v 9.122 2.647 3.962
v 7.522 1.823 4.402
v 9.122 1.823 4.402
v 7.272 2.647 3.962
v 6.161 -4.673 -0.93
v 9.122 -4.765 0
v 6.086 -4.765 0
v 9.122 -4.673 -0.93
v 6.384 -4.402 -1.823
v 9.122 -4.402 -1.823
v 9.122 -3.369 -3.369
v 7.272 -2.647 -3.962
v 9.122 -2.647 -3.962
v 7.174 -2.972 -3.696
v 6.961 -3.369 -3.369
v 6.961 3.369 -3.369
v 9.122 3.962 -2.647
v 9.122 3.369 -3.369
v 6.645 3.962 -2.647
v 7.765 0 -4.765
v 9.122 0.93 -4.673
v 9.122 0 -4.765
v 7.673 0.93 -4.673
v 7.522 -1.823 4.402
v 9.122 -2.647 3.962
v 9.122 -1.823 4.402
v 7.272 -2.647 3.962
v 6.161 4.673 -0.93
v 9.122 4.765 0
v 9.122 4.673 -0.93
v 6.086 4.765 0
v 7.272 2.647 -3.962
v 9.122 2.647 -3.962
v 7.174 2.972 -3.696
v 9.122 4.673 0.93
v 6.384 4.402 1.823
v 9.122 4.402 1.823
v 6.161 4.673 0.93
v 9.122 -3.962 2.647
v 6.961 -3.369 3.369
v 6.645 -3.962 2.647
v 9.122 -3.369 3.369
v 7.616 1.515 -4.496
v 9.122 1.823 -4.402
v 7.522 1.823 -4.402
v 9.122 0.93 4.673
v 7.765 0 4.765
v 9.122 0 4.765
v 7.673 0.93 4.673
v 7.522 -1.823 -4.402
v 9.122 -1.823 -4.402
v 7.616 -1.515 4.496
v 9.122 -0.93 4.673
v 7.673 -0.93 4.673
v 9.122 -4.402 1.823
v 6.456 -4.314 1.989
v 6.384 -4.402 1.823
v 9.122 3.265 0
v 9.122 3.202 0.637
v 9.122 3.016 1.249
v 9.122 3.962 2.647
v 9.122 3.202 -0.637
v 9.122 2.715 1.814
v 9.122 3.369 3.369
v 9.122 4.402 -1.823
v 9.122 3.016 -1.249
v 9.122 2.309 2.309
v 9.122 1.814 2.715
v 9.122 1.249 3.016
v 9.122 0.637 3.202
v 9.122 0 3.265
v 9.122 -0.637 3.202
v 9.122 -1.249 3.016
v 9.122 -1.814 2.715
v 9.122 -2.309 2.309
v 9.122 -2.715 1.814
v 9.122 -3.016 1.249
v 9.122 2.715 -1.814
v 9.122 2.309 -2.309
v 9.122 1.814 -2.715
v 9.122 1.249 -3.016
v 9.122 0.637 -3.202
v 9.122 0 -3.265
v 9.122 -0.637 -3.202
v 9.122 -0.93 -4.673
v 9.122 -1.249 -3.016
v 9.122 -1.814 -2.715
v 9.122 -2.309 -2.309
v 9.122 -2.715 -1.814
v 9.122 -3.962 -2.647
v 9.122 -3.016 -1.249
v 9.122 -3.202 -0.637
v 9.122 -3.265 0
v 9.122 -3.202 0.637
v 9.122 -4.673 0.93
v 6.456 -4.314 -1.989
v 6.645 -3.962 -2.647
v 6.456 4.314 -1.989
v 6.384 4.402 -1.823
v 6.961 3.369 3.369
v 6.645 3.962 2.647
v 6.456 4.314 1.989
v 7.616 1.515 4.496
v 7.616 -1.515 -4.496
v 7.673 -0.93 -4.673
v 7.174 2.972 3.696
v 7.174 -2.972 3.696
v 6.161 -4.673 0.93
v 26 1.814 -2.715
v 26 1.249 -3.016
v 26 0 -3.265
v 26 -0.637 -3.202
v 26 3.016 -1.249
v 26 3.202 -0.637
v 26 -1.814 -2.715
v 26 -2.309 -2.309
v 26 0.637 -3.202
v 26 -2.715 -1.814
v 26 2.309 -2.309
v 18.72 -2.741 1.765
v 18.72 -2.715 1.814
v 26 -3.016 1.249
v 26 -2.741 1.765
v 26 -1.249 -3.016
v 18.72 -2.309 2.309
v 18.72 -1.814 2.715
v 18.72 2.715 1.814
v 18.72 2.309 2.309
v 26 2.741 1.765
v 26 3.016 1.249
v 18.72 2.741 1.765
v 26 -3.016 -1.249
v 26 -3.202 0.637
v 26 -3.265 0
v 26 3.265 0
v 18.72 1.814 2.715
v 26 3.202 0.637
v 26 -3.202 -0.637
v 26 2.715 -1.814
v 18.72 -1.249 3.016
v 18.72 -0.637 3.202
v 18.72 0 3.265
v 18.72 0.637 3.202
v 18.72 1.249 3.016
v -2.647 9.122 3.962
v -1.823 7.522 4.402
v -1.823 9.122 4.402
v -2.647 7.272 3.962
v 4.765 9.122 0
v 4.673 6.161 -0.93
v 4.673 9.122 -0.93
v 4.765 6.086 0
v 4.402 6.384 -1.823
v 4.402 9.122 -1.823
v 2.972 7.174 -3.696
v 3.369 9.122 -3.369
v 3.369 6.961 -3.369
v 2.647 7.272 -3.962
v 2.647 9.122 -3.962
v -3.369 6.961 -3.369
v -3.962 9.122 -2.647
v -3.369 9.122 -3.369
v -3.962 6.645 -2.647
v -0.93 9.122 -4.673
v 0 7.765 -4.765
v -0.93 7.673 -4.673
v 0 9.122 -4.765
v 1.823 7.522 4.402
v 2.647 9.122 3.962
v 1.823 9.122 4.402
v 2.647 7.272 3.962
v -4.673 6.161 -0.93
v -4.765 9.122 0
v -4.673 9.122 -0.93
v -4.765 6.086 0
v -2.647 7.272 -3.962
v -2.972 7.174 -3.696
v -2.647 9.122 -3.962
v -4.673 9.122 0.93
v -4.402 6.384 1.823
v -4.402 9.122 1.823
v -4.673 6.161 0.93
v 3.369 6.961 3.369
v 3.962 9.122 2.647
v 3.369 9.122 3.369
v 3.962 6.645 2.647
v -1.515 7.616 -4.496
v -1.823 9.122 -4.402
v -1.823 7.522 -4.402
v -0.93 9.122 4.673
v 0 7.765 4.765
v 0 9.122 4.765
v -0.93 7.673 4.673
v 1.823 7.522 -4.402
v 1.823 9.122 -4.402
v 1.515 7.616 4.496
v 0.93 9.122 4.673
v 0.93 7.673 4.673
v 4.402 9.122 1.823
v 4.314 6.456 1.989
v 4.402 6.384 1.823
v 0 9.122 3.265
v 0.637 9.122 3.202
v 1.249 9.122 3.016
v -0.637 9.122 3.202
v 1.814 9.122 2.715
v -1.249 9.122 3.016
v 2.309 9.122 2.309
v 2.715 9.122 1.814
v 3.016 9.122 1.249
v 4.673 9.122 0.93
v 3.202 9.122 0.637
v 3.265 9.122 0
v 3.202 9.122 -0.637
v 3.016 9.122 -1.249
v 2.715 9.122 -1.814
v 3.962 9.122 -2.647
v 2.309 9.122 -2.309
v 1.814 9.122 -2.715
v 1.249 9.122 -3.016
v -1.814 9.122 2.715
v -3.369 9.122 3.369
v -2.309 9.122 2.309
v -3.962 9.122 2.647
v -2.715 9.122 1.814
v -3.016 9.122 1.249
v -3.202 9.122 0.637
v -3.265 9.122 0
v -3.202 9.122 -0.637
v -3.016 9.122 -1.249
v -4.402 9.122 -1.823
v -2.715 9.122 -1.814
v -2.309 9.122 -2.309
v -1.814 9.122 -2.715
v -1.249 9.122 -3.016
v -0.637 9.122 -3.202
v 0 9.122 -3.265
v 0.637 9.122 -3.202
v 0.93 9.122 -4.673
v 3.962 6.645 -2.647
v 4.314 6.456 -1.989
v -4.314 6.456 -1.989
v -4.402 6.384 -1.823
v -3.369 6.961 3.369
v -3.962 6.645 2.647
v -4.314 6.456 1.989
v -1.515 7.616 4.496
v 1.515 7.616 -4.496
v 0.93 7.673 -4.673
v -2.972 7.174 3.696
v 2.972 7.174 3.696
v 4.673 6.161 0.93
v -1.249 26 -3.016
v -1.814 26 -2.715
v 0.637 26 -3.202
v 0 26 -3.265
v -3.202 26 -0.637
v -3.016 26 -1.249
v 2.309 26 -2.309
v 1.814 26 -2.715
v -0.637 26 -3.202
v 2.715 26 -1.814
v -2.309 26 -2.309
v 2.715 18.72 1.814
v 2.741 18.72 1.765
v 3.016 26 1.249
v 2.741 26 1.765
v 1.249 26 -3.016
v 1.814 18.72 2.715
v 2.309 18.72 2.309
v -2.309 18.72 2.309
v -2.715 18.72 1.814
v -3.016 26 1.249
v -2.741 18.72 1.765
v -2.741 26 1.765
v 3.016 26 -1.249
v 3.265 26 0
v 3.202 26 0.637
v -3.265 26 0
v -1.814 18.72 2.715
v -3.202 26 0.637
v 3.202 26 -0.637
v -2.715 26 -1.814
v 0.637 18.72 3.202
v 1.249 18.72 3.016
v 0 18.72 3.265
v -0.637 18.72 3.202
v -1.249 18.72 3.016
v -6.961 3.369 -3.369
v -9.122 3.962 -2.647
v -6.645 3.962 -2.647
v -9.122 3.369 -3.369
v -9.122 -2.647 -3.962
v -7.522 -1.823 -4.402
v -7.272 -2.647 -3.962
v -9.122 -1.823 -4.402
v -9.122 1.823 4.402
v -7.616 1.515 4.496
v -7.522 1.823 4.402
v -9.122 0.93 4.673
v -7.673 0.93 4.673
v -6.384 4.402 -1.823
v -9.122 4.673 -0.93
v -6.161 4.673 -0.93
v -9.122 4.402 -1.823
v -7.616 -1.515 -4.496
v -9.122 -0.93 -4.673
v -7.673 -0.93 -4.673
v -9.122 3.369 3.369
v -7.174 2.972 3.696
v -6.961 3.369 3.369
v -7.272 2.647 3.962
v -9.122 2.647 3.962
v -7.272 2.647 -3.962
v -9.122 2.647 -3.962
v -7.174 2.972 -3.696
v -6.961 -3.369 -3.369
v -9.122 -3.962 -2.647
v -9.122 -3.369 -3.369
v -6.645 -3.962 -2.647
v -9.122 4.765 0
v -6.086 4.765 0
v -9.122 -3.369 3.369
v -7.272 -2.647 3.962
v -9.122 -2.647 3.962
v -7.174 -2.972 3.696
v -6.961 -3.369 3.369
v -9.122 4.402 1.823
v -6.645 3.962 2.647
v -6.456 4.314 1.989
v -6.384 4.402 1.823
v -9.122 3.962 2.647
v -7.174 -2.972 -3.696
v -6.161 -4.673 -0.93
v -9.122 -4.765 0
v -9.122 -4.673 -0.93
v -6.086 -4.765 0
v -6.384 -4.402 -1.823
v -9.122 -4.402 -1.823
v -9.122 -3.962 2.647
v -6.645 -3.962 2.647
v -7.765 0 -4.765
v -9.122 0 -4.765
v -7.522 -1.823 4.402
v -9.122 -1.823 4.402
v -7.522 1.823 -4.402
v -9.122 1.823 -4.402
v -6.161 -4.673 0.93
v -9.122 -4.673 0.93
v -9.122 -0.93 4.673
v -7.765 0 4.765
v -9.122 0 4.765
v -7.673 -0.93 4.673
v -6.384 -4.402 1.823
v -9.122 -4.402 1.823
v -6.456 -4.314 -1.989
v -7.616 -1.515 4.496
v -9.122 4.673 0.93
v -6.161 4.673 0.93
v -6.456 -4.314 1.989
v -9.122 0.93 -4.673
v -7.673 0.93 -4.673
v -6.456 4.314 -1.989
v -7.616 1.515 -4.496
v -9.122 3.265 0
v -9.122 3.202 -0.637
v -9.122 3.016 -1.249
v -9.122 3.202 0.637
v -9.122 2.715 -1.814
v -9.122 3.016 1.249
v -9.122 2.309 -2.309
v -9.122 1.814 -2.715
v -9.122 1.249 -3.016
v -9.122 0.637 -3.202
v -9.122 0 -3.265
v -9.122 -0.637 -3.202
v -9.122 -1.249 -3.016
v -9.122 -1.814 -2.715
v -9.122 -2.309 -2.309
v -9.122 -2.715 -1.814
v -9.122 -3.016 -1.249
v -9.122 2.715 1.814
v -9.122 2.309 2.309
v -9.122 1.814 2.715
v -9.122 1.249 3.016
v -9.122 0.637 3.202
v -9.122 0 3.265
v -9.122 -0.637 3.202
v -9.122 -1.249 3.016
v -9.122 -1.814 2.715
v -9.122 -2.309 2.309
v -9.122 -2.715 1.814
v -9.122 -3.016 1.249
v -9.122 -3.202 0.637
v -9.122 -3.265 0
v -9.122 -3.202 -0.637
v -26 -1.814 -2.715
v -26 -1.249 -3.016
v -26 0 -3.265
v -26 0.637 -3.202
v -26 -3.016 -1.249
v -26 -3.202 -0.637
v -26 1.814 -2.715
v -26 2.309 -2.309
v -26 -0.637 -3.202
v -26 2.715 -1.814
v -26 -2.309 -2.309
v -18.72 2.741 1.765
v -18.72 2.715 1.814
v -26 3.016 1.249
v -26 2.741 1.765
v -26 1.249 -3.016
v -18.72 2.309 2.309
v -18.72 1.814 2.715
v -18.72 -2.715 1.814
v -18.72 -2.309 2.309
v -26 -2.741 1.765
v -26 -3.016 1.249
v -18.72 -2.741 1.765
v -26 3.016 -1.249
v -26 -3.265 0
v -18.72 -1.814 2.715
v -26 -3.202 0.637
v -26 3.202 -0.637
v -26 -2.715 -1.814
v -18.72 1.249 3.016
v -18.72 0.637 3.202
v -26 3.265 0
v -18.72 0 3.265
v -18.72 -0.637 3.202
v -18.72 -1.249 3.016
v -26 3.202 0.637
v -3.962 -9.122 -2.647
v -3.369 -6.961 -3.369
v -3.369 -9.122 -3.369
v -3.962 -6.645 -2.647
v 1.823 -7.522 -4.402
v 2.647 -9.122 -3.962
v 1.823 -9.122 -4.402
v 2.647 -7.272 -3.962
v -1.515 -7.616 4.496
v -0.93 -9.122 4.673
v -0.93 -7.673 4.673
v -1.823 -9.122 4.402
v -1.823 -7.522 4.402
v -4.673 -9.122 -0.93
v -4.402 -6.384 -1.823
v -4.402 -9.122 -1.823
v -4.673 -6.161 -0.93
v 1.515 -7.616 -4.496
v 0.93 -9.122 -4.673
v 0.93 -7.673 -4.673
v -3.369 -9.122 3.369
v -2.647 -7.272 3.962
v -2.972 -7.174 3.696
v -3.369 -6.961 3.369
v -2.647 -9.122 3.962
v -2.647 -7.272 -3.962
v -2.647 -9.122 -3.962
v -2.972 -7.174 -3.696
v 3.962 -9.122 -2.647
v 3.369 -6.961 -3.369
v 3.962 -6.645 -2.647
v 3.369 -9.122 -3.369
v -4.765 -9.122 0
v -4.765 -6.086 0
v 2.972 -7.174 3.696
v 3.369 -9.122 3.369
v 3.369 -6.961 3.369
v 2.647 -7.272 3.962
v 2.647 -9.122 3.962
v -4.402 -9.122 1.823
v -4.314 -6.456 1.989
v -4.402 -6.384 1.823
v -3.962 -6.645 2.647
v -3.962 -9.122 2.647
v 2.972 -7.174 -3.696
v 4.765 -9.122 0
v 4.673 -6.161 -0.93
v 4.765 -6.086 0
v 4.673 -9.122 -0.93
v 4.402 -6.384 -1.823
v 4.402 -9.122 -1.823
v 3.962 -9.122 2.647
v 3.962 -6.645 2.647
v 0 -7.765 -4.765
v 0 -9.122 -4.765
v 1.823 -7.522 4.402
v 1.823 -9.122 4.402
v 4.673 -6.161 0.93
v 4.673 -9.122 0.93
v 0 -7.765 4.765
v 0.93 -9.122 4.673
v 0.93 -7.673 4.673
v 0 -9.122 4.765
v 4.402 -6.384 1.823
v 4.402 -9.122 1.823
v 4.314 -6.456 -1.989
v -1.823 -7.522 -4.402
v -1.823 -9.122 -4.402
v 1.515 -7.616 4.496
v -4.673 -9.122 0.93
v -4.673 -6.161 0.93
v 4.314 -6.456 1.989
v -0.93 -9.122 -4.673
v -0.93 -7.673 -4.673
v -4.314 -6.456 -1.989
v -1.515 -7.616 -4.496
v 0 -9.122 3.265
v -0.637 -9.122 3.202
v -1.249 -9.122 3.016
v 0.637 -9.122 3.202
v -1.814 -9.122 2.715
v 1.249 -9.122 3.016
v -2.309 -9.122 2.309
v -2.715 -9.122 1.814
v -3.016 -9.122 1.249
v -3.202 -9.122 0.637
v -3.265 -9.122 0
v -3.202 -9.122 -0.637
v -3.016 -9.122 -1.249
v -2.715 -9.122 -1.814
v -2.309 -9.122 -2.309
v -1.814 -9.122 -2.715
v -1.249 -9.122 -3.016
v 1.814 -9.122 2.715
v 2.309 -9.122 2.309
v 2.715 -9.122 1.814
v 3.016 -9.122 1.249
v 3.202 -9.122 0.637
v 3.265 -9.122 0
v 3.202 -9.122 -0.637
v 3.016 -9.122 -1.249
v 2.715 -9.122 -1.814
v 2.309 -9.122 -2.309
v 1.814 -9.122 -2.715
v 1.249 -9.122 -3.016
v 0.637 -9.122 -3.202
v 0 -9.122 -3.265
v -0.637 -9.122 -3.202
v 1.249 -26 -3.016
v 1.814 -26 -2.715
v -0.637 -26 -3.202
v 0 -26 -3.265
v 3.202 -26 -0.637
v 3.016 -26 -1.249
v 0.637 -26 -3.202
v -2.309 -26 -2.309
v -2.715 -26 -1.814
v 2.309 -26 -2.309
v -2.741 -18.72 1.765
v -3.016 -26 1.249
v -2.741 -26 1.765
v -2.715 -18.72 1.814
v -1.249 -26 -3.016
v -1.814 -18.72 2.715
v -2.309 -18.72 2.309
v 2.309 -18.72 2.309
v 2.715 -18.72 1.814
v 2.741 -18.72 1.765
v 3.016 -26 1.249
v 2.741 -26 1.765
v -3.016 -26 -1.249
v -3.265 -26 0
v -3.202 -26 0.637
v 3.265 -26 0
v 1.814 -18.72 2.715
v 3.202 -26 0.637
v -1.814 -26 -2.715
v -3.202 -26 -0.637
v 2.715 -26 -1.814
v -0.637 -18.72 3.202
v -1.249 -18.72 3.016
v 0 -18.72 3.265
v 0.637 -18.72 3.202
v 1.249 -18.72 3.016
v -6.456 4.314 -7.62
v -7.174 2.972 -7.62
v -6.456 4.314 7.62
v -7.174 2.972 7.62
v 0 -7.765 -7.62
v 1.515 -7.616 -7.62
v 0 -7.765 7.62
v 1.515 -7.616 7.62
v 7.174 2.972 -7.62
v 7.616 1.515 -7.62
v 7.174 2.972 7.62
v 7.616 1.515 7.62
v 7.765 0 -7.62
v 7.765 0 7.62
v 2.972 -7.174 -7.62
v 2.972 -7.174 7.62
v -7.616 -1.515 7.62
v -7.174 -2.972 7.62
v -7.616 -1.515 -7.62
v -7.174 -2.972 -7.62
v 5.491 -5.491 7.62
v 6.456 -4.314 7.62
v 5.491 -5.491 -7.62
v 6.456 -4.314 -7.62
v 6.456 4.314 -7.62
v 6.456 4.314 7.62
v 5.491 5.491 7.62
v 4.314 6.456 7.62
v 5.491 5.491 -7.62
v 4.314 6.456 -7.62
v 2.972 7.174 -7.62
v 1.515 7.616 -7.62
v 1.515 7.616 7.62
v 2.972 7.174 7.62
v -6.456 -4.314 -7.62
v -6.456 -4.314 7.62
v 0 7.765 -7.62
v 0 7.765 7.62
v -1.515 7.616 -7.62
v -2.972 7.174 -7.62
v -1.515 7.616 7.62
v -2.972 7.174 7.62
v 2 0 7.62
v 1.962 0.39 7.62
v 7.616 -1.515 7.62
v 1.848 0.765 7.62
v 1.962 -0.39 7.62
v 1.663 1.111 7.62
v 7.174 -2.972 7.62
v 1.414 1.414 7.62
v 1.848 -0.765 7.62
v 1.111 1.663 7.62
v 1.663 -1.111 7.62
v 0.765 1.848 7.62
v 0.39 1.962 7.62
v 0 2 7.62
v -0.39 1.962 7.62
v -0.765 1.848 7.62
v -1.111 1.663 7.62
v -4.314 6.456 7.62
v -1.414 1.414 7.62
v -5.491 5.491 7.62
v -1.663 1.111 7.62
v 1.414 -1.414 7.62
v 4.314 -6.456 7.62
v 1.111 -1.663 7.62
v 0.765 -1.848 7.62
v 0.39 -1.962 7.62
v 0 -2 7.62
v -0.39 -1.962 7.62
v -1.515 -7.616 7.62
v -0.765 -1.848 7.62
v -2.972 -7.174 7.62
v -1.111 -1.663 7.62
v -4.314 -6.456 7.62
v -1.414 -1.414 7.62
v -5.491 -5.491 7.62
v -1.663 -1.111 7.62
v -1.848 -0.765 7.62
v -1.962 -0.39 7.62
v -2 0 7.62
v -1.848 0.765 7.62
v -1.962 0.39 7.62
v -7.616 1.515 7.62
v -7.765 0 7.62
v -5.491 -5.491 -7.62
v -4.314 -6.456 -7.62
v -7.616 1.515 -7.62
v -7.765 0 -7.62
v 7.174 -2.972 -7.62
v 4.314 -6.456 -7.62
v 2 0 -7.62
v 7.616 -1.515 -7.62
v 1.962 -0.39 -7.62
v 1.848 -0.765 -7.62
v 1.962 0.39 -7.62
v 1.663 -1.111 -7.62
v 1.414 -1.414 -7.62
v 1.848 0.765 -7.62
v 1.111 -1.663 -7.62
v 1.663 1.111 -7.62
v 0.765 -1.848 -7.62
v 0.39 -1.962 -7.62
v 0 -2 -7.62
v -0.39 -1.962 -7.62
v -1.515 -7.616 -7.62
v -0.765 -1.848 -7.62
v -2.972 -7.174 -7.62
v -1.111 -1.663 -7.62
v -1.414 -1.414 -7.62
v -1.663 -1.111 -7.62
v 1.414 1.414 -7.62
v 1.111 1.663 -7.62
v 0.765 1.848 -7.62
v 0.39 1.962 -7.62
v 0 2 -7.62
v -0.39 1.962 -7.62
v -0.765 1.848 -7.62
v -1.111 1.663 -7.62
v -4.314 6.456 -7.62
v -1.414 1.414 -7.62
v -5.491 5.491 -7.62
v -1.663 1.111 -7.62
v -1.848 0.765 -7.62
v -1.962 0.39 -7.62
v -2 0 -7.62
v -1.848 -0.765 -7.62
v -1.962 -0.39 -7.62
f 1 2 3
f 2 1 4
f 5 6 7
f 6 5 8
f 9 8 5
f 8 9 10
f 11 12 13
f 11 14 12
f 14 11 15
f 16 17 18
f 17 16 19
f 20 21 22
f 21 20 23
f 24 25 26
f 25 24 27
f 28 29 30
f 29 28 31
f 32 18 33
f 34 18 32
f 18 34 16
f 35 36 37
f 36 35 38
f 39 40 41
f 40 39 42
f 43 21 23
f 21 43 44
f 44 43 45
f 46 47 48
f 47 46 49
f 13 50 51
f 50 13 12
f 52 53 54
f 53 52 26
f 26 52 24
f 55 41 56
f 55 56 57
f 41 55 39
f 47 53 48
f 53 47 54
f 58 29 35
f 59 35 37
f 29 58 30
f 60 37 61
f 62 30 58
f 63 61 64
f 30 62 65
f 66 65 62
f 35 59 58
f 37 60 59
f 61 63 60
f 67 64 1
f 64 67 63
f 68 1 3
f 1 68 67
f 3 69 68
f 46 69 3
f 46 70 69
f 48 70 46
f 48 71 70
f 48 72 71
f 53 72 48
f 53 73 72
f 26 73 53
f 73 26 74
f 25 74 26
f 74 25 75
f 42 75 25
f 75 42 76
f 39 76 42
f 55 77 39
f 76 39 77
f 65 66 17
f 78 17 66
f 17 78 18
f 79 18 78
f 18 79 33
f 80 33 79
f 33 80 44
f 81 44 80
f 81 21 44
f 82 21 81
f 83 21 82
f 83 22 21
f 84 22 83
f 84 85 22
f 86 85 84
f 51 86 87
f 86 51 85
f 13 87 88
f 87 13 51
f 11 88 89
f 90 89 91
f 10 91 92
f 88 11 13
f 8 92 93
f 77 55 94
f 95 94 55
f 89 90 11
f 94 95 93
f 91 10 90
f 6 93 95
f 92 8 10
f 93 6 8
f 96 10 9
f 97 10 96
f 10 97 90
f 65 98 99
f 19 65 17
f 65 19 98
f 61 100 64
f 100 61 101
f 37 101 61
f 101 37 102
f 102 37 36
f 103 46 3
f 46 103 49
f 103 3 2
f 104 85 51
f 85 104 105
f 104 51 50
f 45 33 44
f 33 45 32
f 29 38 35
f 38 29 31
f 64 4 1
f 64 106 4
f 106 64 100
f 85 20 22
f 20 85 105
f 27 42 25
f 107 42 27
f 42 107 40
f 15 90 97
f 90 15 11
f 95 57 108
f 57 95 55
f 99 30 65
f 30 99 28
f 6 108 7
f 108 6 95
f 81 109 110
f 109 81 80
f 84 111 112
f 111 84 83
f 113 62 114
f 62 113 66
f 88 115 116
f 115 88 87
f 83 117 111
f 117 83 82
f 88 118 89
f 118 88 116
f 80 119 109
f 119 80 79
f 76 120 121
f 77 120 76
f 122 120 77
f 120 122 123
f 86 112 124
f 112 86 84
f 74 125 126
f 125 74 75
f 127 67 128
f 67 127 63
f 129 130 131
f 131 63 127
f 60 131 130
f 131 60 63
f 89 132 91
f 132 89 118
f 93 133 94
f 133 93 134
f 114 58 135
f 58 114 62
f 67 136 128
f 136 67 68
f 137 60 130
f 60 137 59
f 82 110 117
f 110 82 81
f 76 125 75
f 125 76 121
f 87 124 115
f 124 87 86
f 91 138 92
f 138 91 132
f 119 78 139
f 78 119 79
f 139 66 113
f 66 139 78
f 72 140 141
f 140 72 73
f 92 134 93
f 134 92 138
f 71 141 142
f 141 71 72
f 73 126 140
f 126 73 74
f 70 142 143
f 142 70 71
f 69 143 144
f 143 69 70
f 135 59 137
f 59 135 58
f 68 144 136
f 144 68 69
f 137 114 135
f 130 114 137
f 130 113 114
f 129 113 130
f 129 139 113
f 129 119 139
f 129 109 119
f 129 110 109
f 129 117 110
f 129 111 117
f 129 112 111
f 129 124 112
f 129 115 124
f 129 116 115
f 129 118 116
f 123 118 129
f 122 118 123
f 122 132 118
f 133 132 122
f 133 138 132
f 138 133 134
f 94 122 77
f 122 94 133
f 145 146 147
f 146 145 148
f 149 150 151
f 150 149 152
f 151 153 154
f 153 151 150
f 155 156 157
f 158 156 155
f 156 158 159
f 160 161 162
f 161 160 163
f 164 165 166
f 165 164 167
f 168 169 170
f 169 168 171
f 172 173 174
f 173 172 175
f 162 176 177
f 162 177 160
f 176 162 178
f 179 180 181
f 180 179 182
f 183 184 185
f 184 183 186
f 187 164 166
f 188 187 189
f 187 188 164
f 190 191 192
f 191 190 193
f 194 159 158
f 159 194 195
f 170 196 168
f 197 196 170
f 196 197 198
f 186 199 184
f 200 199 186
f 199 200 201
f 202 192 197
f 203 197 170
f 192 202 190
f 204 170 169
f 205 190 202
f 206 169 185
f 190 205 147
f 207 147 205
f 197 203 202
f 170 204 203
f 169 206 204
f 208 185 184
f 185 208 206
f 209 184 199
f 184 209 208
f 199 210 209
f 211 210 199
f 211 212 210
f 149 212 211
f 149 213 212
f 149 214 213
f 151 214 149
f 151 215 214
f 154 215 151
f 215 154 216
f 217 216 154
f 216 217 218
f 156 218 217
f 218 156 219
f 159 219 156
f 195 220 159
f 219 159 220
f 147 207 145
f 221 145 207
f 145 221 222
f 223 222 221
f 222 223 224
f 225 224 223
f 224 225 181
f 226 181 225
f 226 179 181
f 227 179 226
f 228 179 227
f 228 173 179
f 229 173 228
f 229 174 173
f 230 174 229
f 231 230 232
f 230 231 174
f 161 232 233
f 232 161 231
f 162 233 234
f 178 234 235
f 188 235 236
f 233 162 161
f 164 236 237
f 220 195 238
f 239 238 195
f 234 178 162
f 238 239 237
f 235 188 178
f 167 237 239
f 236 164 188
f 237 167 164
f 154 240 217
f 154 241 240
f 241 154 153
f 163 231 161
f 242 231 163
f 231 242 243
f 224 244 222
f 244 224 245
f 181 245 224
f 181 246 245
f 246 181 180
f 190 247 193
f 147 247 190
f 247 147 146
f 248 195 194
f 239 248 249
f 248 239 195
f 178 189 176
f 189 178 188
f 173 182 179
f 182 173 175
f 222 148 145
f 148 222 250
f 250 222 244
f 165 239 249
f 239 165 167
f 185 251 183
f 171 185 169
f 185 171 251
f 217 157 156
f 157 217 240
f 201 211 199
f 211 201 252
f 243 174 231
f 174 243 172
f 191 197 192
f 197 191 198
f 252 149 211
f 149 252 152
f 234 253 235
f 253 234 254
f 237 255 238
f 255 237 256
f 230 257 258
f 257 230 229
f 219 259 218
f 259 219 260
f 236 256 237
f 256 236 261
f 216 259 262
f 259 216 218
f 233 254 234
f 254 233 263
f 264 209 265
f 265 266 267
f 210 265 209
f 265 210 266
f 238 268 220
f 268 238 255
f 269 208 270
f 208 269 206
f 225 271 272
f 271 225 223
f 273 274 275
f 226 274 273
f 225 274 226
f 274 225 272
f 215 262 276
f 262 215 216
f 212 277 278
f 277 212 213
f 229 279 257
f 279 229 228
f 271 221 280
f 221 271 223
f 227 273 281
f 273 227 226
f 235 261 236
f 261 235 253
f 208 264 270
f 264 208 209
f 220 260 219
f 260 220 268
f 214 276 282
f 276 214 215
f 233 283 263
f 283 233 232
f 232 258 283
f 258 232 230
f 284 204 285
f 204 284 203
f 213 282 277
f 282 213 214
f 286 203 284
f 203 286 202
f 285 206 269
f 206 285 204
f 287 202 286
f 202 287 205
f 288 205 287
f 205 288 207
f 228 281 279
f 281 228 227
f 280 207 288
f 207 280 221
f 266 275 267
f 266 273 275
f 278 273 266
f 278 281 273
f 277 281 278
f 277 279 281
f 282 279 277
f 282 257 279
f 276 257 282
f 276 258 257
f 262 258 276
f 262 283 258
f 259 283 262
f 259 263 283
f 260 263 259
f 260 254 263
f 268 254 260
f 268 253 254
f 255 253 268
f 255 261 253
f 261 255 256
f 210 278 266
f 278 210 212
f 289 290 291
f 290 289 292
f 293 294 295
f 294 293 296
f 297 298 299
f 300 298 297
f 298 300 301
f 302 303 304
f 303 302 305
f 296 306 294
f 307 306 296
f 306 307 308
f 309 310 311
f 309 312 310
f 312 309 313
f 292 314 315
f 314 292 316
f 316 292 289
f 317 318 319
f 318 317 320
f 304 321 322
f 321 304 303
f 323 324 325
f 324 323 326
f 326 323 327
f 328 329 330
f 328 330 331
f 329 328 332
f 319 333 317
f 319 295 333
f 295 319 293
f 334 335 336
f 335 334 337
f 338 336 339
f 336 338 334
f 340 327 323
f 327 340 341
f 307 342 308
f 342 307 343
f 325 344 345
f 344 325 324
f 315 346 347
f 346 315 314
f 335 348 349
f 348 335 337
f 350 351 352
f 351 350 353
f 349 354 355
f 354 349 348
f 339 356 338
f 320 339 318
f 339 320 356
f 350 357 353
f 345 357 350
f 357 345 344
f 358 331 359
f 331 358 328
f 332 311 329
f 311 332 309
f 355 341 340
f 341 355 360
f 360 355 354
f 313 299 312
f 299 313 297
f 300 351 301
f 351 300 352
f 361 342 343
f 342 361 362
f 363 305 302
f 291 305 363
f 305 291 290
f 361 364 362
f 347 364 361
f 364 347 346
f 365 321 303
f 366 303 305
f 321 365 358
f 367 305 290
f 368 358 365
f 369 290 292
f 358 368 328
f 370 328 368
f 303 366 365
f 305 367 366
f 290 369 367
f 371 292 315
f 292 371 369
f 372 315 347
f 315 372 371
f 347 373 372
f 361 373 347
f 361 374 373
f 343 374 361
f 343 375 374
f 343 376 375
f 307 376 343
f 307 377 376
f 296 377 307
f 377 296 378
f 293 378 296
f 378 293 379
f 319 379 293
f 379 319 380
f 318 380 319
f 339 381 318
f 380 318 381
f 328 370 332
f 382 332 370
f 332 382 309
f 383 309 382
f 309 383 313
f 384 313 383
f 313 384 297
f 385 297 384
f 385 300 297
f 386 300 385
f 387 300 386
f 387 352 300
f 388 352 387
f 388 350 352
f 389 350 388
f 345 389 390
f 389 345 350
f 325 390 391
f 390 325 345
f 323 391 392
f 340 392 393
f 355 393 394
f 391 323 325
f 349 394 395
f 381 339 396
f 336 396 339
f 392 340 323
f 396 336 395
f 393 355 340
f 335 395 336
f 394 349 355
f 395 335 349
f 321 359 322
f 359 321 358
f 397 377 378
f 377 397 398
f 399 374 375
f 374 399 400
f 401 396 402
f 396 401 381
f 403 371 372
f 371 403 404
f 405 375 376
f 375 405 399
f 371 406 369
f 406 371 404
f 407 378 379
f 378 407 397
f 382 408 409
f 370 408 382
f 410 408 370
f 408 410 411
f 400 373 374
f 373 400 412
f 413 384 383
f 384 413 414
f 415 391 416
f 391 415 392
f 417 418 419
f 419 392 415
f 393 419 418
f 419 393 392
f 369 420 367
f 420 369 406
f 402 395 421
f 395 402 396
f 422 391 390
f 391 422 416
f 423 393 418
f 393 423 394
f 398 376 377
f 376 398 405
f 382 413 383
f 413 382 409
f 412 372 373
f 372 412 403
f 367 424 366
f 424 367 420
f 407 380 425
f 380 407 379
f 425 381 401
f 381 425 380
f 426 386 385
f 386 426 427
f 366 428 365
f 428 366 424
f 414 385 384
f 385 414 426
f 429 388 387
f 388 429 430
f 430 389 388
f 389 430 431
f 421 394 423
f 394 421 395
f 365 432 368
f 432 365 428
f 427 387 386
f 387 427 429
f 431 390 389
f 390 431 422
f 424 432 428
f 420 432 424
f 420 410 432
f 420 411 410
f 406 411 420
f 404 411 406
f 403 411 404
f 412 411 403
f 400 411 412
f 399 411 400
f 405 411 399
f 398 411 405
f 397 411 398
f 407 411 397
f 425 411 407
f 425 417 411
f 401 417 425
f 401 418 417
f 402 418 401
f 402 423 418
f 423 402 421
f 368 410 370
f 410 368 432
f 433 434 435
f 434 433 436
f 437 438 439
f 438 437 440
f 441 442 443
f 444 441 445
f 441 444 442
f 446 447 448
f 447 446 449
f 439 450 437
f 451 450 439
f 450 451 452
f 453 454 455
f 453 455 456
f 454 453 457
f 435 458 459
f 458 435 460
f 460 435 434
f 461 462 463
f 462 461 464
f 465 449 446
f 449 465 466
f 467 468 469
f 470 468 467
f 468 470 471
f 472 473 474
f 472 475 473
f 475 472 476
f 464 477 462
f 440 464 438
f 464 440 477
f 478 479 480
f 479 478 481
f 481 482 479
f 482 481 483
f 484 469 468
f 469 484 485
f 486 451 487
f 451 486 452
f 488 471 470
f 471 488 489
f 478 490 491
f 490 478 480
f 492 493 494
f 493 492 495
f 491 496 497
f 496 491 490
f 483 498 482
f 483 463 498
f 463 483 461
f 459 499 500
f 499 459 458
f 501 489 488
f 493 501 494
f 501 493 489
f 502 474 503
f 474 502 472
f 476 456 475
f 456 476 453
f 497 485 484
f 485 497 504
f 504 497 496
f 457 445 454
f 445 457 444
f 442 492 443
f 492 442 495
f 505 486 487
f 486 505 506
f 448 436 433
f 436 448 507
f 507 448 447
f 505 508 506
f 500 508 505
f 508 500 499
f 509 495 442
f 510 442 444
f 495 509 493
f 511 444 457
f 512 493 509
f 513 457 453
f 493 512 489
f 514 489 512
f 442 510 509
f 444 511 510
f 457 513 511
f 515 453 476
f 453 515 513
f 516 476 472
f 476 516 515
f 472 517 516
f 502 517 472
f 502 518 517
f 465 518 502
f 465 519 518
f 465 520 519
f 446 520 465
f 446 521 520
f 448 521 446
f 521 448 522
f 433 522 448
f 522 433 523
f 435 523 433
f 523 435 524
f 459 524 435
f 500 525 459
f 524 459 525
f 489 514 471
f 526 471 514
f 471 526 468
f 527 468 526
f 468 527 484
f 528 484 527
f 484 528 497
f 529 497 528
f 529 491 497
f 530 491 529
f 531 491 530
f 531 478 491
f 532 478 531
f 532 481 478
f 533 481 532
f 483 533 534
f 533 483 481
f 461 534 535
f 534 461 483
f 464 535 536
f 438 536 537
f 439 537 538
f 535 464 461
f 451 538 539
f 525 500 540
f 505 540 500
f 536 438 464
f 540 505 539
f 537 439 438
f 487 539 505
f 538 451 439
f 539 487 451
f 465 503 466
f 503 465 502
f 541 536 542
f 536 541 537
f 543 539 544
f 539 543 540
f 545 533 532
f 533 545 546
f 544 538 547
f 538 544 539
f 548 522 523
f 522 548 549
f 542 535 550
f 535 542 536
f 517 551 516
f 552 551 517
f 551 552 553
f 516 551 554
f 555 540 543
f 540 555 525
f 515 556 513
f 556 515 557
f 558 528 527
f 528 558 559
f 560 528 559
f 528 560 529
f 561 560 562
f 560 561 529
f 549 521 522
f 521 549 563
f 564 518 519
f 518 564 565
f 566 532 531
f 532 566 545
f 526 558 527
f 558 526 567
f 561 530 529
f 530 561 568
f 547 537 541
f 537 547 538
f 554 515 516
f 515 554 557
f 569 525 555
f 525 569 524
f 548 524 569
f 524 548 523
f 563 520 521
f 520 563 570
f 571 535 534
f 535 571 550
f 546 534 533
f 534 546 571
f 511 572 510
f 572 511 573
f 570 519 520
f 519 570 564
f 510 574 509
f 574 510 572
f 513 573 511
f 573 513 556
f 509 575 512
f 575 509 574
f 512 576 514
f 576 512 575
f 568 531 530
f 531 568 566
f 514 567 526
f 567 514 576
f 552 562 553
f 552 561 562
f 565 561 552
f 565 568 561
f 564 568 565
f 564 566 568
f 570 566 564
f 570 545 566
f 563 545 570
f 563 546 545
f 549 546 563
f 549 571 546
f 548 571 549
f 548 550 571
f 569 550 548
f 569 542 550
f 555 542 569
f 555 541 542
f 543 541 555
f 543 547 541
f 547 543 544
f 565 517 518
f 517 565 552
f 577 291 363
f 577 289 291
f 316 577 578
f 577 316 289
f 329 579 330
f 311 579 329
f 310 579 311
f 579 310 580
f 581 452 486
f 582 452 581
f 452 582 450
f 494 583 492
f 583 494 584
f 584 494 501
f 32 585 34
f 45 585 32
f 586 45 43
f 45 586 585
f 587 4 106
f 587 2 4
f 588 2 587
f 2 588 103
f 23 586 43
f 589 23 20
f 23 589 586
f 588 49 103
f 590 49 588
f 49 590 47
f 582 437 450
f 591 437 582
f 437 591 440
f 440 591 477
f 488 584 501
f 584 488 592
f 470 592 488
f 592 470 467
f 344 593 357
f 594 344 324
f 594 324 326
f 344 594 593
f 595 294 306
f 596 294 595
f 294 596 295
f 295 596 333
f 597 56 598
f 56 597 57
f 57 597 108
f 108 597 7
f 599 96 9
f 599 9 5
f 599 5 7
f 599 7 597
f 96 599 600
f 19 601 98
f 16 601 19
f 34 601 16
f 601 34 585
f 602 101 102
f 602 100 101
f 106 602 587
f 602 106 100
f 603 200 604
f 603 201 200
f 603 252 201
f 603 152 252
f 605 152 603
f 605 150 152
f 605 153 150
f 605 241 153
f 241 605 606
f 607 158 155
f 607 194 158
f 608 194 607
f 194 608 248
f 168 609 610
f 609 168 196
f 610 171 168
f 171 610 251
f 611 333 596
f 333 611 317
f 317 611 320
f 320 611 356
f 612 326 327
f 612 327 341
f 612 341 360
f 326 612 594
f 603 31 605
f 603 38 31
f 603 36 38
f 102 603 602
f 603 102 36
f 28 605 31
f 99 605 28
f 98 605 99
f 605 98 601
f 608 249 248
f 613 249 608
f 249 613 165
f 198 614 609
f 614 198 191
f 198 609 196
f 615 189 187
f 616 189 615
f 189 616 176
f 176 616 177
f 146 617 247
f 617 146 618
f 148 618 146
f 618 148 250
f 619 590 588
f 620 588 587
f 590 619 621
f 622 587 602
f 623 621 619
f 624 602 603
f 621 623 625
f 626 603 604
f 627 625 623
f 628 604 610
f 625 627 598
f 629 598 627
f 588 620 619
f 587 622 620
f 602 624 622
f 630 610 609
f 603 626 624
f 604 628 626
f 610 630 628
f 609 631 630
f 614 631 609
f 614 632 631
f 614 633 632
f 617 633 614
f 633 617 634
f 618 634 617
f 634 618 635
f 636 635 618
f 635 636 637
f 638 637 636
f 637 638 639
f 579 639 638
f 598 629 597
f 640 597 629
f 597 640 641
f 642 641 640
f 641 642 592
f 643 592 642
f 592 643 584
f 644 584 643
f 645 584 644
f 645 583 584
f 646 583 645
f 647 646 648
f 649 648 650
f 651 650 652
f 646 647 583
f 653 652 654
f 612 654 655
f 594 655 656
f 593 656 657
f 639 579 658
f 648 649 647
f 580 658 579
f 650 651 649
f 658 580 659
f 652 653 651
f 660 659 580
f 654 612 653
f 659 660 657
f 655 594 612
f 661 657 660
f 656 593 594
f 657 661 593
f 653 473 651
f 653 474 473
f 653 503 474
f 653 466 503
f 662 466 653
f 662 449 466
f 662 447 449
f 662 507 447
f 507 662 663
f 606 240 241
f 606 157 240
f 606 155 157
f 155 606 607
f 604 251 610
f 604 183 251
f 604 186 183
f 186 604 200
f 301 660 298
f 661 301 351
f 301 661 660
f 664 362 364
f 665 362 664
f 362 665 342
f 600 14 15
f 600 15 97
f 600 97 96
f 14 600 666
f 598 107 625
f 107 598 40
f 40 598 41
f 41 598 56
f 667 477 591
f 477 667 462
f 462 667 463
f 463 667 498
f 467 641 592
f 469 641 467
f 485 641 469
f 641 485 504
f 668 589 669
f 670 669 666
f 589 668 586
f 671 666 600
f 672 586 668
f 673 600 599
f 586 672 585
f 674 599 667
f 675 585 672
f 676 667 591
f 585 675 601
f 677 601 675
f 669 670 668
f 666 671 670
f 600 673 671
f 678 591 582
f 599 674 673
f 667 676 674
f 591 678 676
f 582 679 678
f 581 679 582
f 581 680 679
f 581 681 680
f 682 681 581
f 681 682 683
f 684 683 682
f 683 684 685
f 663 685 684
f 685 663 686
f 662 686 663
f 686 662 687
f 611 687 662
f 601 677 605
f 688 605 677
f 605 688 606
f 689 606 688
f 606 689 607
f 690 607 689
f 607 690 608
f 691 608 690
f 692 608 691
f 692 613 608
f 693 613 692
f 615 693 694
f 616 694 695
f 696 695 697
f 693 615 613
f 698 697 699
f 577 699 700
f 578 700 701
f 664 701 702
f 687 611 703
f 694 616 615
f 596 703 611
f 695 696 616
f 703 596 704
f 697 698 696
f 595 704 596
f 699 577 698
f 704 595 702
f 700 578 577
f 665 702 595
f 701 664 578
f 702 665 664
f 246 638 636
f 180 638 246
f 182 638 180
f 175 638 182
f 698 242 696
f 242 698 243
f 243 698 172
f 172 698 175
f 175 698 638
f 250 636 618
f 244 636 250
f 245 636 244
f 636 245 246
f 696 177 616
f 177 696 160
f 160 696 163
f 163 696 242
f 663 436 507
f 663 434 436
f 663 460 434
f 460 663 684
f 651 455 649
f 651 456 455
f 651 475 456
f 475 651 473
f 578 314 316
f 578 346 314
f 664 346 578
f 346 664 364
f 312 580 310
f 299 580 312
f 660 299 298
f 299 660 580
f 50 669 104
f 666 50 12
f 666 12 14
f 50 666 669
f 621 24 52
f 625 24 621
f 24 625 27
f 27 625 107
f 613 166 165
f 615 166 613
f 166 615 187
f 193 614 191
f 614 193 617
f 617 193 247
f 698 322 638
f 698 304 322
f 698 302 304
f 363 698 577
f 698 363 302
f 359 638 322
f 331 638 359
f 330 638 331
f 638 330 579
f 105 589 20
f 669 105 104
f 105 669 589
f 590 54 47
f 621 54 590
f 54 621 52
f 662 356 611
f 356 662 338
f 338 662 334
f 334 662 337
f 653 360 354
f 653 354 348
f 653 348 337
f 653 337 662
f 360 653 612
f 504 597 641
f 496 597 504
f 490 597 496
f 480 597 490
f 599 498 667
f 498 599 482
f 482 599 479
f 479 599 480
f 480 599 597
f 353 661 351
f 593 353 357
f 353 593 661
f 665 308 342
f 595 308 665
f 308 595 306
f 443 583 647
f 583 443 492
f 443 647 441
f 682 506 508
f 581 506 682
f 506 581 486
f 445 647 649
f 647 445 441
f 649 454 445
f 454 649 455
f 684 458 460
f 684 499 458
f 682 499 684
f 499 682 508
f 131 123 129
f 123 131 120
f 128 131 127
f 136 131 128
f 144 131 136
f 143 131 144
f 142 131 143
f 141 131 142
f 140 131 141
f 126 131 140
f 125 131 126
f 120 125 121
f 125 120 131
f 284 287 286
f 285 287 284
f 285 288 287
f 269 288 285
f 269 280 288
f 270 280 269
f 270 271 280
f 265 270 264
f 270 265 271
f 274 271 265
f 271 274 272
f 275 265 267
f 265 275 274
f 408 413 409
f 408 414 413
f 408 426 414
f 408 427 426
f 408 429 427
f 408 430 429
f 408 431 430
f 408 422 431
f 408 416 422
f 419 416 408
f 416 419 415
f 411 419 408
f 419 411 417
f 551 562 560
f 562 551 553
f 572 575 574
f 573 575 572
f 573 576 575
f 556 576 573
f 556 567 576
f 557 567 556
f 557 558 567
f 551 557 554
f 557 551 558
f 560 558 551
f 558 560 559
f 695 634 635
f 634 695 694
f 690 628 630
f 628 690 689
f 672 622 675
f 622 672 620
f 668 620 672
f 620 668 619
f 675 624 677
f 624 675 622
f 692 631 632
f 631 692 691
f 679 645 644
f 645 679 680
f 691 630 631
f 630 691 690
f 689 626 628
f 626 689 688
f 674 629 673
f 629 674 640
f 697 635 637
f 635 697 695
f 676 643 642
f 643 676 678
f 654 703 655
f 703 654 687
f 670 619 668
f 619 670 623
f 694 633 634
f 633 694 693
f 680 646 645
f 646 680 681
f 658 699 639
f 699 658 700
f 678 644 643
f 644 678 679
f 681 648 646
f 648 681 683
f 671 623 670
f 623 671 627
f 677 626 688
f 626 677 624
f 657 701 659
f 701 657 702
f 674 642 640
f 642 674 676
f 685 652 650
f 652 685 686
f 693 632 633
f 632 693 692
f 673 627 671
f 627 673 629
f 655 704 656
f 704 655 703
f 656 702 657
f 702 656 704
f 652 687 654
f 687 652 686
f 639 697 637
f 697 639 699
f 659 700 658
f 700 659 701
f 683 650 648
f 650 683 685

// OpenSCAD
$fn = 32;

// ----------------------------------------------------------------------
// Cardan cross: 52 mm span, 9.53 mm trunnions
// ----------------------------------------------------------------------

// --- parameters (mm) ---
journal_d = 9.53;         // trunnion diameter
arm_len = 26;             // trunnion length from the centre
step_r = 3.24;            // step position from the centre
step_d = 6.53;            // journal diameter after the step
hub_d = 15.53;            // hub diameter
hub_h = 15.24;            // hub height
bore_d = 4;               // hub bore
flat_d = 1.5;             // depth of the journal flat
flat_len = 7.28;          // length of the journal flat

difference() {
  union() {
    /* hub along the joint axis */
    cylinder(h = hub_h, d = hub_d, center = true);
    for (a = [0 : 90 : 270]) rotate([0, 0, a]) {
      /* trunnion, sunk into the hub */
      translate([hub_d / 4, 0, 0]) rotate([0, 90, 0]) cylinder(h = step_r + 2, d = journal_d);
      /* stepped journal out to the tip */
      translate([step_r - 0.5, 0, 0]) rotate([0, 90, 0]) cylinder(h = arm_len + 0.5 - step_r, d = step_d);
    }
  }
  /* lubrication bore through the hub, 2.5 mm clear on both sides */
  translate([0, 0, -hub_h / 2 - 2.5]) cylinder(h = hub_h + 5, d = bore_d);
  /* machined flat on each journal tip */
  for (a = [0 : 90 : 270]) rotate([0, 0, a]) {
    translate([arm_len - flat_len, -step_d, step_d / 2 - flat_d]) cube([flat_len + 0.5, 2 * step_d, flat_d + 2.5]);
  }
}
